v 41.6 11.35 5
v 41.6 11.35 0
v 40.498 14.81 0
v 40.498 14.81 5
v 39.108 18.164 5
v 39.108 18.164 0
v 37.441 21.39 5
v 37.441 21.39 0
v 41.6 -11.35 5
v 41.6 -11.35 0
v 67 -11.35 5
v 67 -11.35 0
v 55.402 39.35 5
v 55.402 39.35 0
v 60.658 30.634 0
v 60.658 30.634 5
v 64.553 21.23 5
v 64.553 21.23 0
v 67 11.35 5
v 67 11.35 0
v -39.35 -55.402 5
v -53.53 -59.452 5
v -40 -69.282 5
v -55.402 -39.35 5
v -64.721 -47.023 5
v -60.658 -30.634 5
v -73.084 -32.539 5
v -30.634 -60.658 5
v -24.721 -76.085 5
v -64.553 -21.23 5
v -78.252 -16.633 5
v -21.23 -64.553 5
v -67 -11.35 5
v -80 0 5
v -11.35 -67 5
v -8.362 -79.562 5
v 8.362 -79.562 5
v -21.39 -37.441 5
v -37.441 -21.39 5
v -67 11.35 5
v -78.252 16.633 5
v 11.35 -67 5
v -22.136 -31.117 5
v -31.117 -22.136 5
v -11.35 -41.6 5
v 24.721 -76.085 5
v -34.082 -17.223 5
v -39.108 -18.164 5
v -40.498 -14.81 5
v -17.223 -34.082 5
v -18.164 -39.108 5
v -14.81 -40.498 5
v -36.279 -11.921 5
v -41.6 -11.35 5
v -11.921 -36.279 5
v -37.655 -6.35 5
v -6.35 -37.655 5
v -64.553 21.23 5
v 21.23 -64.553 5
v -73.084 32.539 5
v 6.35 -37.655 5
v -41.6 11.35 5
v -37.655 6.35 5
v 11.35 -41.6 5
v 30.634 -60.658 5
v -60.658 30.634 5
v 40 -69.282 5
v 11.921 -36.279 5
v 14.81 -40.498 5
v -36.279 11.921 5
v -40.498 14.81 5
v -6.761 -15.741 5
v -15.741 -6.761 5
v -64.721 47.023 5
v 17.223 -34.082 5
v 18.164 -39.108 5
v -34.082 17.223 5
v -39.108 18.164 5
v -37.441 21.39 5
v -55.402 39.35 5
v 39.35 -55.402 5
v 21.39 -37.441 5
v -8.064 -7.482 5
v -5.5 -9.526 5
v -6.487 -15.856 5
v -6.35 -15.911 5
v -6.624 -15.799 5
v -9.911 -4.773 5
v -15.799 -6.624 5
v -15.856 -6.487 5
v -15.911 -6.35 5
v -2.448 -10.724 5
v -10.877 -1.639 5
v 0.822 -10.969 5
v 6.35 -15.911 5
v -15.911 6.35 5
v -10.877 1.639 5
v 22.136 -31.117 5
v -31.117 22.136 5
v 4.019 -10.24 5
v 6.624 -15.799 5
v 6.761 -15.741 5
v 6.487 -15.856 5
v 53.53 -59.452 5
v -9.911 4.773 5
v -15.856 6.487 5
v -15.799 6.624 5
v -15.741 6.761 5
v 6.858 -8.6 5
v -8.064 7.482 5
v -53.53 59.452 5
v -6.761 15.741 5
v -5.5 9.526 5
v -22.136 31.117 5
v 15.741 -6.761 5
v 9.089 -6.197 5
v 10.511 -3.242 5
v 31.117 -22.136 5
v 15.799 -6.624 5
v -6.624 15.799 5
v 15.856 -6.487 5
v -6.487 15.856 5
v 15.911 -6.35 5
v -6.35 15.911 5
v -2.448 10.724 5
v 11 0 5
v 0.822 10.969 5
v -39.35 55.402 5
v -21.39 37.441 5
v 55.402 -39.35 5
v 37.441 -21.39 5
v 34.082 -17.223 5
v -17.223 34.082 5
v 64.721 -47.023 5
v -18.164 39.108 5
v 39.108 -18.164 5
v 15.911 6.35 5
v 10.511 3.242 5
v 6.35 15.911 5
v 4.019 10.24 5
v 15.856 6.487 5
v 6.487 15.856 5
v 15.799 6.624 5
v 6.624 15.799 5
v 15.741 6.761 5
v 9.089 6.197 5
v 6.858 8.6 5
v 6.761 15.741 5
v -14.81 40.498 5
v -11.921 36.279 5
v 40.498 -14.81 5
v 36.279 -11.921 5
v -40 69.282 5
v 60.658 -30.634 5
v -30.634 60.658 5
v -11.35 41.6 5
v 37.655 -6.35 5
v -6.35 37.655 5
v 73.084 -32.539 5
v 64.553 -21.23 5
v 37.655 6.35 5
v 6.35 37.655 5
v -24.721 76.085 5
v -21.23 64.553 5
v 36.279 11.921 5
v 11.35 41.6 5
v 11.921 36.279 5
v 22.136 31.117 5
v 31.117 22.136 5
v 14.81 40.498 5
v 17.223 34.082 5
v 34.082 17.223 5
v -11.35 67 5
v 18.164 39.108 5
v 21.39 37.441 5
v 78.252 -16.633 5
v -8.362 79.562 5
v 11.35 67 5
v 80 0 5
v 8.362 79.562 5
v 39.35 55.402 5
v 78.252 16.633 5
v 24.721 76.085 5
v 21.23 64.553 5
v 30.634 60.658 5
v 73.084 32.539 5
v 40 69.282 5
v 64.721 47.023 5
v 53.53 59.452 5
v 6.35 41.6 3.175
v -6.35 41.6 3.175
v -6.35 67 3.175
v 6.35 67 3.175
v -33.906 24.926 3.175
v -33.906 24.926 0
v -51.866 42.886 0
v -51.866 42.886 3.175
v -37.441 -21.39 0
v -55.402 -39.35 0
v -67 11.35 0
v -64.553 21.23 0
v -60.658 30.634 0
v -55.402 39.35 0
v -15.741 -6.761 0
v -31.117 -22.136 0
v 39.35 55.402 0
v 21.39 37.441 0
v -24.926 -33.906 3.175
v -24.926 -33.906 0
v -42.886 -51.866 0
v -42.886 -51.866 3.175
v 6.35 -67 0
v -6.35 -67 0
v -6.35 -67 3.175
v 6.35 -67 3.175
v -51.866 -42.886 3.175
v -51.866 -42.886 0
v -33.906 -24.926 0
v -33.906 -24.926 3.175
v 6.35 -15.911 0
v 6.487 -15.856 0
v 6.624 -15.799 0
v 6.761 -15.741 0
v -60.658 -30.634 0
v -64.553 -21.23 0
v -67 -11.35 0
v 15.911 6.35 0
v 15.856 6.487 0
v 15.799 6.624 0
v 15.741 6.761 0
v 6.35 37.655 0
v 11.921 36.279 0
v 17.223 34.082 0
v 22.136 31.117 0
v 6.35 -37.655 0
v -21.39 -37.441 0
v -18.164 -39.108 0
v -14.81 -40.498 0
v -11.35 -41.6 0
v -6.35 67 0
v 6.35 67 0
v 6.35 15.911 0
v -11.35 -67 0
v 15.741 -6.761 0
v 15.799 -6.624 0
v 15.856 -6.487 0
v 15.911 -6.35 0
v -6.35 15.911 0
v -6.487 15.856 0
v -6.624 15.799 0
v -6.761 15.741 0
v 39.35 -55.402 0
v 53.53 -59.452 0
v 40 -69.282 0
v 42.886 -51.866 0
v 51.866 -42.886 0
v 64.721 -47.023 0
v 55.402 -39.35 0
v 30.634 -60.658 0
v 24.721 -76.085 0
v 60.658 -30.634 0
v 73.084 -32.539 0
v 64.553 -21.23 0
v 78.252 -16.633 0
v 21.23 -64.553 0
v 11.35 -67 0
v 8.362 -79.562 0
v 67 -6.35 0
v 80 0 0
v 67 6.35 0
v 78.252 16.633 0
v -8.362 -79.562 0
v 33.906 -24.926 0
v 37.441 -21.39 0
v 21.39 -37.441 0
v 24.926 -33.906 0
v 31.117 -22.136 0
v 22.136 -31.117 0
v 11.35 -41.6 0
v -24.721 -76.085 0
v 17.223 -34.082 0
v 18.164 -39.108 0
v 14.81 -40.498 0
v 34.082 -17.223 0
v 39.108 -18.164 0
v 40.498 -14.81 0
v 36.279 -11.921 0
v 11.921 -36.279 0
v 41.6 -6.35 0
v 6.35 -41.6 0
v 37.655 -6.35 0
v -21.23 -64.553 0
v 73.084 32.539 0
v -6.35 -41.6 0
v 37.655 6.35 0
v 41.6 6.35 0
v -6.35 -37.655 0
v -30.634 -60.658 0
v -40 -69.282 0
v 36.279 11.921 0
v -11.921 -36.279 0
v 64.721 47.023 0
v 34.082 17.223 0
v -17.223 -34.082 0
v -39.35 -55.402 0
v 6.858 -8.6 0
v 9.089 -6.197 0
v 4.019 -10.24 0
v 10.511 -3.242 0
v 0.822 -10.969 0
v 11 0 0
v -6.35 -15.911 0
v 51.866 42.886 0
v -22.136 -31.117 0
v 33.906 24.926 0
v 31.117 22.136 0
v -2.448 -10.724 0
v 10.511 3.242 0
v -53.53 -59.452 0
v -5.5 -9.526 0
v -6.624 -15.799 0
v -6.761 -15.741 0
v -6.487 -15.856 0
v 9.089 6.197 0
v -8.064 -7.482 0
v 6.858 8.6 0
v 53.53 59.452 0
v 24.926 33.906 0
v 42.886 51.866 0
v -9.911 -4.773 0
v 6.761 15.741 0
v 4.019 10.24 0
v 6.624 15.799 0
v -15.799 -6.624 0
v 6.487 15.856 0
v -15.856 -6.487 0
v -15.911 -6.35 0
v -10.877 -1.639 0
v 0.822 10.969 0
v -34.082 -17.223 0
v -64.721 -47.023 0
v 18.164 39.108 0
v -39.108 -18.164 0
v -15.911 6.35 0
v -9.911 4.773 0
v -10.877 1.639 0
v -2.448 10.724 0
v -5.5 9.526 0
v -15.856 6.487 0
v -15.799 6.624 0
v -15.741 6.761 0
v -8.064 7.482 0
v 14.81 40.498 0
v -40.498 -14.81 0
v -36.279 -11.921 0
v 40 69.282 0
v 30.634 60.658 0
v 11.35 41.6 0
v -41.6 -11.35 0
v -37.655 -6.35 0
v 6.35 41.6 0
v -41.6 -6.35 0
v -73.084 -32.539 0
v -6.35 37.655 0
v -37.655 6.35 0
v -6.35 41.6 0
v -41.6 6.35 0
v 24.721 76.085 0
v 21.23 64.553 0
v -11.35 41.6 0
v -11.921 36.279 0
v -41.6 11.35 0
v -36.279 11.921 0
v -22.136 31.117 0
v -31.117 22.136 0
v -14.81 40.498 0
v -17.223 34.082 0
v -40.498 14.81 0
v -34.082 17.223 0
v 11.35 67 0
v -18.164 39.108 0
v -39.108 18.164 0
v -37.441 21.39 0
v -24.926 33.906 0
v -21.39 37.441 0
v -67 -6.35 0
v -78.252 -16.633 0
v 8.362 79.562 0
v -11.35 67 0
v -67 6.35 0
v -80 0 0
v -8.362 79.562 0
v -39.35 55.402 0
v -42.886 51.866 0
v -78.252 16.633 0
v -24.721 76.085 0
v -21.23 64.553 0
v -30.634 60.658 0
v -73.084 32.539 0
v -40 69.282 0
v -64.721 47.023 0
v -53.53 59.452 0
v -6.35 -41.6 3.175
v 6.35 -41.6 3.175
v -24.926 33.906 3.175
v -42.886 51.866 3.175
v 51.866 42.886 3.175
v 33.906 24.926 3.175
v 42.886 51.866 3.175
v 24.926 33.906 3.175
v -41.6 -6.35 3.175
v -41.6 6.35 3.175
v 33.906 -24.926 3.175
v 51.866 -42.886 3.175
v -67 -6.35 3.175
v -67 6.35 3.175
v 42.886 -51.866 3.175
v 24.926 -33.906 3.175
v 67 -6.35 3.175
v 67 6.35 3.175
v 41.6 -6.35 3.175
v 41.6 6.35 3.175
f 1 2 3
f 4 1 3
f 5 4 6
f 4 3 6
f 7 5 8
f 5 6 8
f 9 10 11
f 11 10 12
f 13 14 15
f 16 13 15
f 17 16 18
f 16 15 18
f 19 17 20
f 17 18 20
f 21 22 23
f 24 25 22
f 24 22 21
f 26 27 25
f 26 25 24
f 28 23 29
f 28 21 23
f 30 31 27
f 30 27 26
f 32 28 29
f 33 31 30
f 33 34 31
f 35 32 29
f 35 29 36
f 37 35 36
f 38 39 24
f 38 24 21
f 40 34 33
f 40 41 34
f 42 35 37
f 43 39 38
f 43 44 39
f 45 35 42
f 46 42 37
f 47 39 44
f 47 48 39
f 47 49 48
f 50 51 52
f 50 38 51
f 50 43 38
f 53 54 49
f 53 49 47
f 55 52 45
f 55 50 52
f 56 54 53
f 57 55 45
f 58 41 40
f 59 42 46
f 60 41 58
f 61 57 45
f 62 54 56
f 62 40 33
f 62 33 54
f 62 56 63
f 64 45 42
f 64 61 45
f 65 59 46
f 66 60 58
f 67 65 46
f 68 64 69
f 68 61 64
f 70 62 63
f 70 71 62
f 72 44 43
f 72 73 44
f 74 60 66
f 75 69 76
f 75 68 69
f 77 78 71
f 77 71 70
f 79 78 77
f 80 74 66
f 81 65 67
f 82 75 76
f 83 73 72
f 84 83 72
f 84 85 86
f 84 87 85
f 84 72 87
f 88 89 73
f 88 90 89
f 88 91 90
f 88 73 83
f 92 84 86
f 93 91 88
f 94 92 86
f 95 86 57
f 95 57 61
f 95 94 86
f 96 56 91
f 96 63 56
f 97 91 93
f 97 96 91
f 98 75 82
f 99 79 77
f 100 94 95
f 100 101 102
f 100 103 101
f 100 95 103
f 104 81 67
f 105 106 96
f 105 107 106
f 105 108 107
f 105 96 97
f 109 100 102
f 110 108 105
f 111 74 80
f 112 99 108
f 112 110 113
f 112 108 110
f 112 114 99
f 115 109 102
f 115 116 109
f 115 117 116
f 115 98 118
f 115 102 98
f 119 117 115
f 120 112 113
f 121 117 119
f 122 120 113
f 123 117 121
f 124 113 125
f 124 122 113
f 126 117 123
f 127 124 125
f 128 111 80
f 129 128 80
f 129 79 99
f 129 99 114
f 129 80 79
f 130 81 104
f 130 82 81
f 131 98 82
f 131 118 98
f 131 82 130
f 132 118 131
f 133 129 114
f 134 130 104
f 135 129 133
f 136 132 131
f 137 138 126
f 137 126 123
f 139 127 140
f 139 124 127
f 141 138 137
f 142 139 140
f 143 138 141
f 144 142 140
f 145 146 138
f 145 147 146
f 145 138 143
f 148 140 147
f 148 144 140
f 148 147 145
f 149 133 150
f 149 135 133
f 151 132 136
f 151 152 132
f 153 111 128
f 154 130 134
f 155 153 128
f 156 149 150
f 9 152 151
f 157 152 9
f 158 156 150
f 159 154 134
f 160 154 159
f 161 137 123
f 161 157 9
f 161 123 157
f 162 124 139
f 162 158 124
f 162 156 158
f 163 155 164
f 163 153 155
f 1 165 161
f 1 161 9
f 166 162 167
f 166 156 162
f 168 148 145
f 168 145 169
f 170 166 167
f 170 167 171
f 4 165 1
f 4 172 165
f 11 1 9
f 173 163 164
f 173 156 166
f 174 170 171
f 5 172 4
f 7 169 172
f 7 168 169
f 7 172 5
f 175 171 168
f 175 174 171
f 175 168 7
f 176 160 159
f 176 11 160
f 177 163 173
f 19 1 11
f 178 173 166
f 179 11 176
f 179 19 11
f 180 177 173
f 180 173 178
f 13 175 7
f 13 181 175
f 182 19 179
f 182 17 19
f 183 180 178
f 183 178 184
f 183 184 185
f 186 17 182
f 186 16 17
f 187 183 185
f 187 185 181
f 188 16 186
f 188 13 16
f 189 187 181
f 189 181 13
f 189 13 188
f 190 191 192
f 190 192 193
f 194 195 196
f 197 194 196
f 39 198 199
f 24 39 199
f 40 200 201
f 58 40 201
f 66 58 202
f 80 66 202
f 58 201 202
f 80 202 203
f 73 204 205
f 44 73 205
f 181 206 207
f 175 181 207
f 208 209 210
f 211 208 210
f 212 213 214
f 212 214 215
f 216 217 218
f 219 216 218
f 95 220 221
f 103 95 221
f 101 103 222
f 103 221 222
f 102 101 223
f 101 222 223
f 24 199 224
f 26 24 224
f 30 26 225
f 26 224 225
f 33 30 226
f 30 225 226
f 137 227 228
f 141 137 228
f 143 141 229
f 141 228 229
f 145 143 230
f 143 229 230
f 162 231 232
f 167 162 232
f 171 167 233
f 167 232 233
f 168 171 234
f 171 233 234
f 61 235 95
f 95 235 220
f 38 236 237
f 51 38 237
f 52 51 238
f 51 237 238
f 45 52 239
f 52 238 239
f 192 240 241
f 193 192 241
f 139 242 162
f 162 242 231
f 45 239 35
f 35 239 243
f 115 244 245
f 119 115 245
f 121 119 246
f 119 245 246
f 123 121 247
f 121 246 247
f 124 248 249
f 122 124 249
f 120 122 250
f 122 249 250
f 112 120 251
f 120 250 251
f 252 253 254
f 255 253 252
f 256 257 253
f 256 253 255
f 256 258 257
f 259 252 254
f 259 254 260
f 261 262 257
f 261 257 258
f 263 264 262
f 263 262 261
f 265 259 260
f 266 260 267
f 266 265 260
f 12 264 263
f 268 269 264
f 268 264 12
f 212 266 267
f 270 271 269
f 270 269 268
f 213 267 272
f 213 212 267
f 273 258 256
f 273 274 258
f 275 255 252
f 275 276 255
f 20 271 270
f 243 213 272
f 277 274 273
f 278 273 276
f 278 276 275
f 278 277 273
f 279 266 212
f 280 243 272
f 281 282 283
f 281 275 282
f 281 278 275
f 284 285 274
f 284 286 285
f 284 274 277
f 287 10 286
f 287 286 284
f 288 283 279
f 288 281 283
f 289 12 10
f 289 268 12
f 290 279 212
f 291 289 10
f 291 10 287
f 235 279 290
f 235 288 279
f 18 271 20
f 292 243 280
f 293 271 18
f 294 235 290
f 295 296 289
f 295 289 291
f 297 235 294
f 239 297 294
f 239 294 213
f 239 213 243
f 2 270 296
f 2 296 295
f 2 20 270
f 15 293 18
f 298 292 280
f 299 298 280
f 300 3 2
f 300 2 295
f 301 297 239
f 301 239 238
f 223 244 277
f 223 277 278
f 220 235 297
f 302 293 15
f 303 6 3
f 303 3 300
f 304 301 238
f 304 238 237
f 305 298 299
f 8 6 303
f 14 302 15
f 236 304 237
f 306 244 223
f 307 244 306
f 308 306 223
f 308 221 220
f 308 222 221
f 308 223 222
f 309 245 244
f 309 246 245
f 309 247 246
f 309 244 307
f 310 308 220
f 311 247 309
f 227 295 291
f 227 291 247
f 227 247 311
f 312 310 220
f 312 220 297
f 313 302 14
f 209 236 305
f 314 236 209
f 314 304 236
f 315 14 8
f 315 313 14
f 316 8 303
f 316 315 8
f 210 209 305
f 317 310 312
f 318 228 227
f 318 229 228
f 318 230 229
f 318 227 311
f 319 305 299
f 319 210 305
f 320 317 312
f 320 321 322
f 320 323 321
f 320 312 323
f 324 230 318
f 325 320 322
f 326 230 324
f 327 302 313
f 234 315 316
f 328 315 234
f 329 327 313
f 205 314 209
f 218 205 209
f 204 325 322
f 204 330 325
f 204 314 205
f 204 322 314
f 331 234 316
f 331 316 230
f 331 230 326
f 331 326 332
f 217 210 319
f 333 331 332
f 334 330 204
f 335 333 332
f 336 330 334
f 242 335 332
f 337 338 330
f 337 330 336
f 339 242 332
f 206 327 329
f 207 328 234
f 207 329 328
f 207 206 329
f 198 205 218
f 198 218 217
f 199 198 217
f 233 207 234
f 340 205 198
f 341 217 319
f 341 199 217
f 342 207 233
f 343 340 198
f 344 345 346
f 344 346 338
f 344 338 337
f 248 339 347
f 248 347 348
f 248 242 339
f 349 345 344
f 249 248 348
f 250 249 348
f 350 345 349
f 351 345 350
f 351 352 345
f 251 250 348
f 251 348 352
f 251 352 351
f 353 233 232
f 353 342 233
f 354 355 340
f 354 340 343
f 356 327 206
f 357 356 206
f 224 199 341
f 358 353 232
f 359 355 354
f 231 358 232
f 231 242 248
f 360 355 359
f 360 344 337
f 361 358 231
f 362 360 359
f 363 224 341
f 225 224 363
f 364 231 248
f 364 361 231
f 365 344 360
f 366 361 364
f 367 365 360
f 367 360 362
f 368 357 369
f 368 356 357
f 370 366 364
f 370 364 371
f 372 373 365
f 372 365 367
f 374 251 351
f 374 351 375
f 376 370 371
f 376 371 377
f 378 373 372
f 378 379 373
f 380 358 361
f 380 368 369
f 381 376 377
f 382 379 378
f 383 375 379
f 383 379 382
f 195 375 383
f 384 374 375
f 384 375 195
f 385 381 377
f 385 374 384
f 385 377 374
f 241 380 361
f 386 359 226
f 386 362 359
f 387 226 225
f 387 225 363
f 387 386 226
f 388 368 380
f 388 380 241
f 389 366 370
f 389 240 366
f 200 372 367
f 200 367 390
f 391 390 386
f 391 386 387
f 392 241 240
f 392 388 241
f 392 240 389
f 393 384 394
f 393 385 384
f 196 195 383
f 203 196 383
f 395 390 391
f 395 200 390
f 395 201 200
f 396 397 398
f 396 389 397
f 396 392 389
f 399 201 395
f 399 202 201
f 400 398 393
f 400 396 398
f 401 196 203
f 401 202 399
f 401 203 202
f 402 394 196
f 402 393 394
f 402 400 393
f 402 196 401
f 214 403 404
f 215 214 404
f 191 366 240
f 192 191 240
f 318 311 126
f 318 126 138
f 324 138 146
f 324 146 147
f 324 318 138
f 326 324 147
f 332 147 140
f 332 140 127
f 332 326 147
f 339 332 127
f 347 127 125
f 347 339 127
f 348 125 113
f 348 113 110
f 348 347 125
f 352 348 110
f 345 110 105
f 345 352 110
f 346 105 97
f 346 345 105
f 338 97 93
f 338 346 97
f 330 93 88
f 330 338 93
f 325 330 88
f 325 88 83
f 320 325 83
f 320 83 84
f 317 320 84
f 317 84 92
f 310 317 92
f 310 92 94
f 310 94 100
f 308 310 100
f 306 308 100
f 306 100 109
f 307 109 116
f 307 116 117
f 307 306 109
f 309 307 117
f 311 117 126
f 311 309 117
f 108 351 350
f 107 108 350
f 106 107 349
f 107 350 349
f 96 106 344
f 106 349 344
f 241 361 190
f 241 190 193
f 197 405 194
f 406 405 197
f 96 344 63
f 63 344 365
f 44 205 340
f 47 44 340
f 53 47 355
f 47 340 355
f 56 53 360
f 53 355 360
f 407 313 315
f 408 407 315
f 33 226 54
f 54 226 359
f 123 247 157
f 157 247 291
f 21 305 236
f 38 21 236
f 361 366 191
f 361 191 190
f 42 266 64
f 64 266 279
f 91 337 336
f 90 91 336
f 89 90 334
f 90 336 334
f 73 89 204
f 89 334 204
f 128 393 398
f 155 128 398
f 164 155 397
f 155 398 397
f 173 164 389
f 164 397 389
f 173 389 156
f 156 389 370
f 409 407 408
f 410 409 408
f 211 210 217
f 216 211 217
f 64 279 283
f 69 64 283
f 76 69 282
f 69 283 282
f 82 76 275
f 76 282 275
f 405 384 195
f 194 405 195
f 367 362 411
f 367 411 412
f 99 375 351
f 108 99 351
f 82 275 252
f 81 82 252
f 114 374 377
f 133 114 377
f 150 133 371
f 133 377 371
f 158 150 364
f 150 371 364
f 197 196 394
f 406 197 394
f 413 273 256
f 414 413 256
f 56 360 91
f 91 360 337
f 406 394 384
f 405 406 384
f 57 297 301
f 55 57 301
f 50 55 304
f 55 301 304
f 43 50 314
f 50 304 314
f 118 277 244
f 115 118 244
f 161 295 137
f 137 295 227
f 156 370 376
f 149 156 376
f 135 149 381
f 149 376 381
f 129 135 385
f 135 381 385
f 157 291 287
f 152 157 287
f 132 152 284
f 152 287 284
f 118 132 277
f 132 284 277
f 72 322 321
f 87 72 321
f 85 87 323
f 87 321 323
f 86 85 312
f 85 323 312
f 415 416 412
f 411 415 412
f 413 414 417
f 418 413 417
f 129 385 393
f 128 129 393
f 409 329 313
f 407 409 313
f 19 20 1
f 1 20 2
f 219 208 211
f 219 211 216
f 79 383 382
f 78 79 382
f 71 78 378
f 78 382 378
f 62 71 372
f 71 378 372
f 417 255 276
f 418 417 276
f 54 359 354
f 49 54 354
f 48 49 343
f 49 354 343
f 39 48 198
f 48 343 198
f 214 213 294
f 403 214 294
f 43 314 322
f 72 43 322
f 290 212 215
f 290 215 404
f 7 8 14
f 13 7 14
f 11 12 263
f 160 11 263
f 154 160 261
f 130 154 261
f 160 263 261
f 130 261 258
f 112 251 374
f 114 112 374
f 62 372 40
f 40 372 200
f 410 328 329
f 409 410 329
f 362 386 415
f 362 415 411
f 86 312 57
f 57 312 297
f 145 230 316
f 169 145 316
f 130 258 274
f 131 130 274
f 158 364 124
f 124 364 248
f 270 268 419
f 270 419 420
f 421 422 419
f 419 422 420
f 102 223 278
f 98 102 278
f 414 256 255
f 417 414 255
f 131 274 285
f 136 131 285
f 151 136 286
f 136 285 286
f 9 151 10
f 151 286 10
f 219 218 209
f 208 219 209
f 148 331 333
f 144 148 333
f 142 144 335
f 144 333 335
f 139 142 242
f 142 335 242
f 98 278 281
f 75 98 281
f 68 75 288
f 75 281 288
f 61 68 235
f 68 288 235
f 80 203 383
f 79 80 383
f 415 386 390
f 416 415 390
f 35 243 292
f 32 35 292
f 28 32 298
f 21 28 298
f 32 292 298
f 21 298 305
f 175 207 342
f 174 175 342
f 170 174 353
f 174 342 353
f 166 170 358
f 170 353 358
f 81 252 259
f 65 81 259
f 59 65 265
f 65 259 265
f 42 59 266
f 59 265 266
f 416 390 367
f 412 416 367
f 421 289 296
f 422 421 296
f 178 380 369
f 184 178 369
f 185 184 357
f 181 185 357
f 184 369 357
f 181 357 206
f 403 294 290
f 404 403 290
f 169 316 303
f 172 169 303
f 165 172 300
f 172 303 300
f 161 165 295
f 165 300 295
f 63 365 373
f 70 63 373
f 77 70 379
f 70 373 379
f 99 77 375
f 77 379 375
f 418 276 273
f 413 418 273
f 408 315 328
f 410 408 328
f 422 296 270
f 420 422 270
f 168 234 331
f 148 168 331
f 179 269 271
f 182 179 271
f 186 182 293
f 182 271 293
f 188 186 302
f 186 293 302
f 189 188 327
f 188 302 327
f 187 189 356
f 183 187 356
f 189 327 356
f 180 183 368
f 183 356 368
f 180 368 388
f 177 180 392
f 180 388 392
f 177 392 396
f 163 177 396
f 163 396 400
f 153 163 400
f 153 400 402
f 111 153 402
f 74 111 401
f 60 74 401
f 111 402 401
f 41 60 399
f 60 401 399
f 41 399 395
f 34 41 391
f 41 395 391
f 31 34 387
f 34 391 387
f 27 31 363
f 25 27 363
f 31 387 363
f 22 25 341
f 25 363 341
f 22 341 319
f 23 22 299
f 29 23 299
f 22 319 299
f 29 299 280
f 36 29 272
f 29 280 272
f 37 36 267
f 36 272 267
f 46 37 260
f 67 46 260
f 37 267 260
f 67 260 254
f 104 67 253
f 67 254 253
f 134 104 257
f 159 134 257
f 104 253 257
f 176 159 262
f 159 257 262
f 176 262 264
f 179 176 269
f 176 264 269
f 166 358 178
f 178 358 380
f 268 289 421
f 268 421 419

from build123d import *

# Parameters (mm, degrees)
SKETCH1_R           = 80
SKETCH1_R_2         = 11
BOSS_EXTRUDE1_DEPTH = 5
SKETCH1_3_W         = 25.4
SKETCH1_3_H         = 12.7
SKETCH1_3_W_2       = 12.7
SKETCH1_3_H_2       = 25.4
CUT_EXTRUDE2_DEPTH  = 3.175
CUT_EXTRUDE3_DEPTH  = 19
CUT_EXTRUDE4_DEPTH  = 19


with BuildPart() as part:
    # Sketch1 → Boss-Extrude1 (new body)
    with BuildSketch(Plane.XY):
        Circle(SKETCH1_R)
        Circle(SKETCH1_R_2, mode=Mode.SUBTRACT)
    extrude(amount=BOSS_EXTRUDE1_DEPTH)

    # Sketch1<3> → Cut-Extrude2 (cut)
    with BuildSketch(Plane.XY):
        Polygon((33.905770158, -24.925514037), (51.8662824, -42.886026279), (42.886026279, -51.8662824), (24.925514037, -33.905770158), align=None)
        with Locations((54.3, 0)):
            Rectangle(SKETCH1_3_W, SKETCH1_3_H)
        with Locations((0, -54.3)):
            Rectangle(SKETCH1_3_W_2, SKETCH1_3_H_2)
        Polygon((-24.925514037, -33.905770158), (-42.886026279, -51.8662824), (-51.8662824, -42.886026279), (-33.905770158, -24.925514037), align=None)
        with Locations((-54.3, 0)):
            Rectangle(SKETCH1_3_W, SKETCH1_3_H)
        Polygon((-33.905770158, 24.925514037), (-51.8662824, 42.886026279), (-42.886026279, 51.8662824), (-24.925514037, 33.905770158), align=None)
        with Locations((0, 54.3)):
            Rectangle(SKETCH1_3_W_2, SKETCH1_3_H_2)
        Polygon((24.925514037, 33.905770158), (42.886026279, 51.8662824), (51.8662824, 42.886026279), (33.905770158, 24.925514037), align=None)
    extrude(amount=CUT_EXTRUDE2_DEPTH, mode=Mode.SUBTRACT)

    # Sketch2 → Cut-Extrude3 (cut)
    with BuildSketch(Plane(origin=(0, 0, 0), x_dir=(-1, 0, 0), z_dir=(0, 0, -1))):
        with BuildLine():
            ThreePointArc((31.116508001, -22.13625188), (35.280233052, -14.613551014), (37.655387628, -6.35))
            Line((37.655387628, -6.35), (15.911210185, -6.35))
            ThreePointArc((15.911210185, -6.35), (15.827464249, -6.55595035), (15.741052679, -6.760796558))
            Line((15.741052679, -6.760796558), (31.116508001, -22.13625188))
        make_face()
        with BuildLine():
            ThreePointArc((6.35, -37.655387628), (14.613551014, -35.280233052), (22.13625188, -31.116508001))
            Line((22.13625188, -31.116508001), (6.760796558, -15.741052679))
            ThreePointArc((6.760796558, -15.741052679), (6.55595035, -15.827464249), (6.35, -15.911210185))
            Line((6.35, -15.911210185), (6.35, -37.655387628))
        make_face()
        with BuildLine():
            Line((15.911210185, 6.35), (37.655387628, 6.35))
            ThreePointArc((37.655387628, 6.35), (35.280233052, 14.613551014), (31.116508001, 22.13625188))
            Line((31.116508001, 22.13625188), (15.741052679, 6.760796558))
            ThreePointArc((15.741052679, 6.760796558), (15.827464249, 6.55595035), (15.911210185, 6.35))
        make_face()
        with BuildLine():
            ThreePointArc((-22.13625188, -31.116508001), (-14.613551014, -35.280233052), (-6.35, -37.655387628))
            Line((-6.35, -37.655387628), (-6.35, -15.911210185))
            ThreePointArc((-6.35, -15.911210185), (-6.55595035, -15.827464249), (-6.760796558, -15.741052679))
            Line((-6.760796558, -15.741052679), (-22.13625188, -31.116508001))
        make_face()
        with BuildLine():
            Line((6.760796558, 15.741052679), (22.13625188, 31.116508001))
            ThreePointArc((22.13625188, 31.116508001), (14.613551014, 35.280233052), (6.35, 37.655387628))
            Line((6.35, 37.655387628), (6.35, 15.911210185))
            ThreePointArc((6.35, 15.911210185), (6.55595035, 15.827464249), (6.760796558, 15.741052679))
        make_face()
        with BuildLine():
            ThreePointArc((-37.655387628, -6.35), (-35.280233052, -14.613551014), (-31.116508001, -22.13625188))
            Line((-31.116508001, -22.13625188), (-15.741052679, -6.760796558))
            ThreePointArc((-15.741052679, -6.760796558), (-15.827464249, -6.55595035), (-15.911210185, -6.35))
            Line((-15.911210185, -6.35), (-37.655387628, -6.35))
        make_face()
        with BuildLine():
            Line((-6.35, 15.911210185), (-6.35, 37.655387628))
            ThreePointArc((-6.35, 37.655387628), (-14.613551014, 35.280233052), (-22.13625188, 31.116508001))
            Line((-22.13625188, 31.116508001), (-6.760796558, 15.741052679))
            ThreePointArc((-6.760796558, 15.741052679), (-6.55595035, 15.827464249), (-6.35, 15.911210185))
        make_face()
        with BuildLine():
            ThreePointArc((-31.116508001, 22.13625188), (-35.280233052, 14.613551014), (-37.655387628, 6.35))
            Line((-37.655387628, 6.35), (-15.911210185, 6.35))
            ThreePointArc((-15.911210185, 6.35), (-15.827464249, 6.55595035), (-15.741052679, 6.760796558))
            Line((-15.741052679, 6.760796558), (-31.116508001, 22.13625188))
        make_face()
    extrude(amount=-CUT_EXTRUDE3_DEPTH, mode=Mode.SUBTRACT)

    # Sketch3 → Cut-Extrude4 (cut)
    with BuildSketch(Plane(origin=(0, 0, 0), x_dir=(-1, 0, 0), z_dir=(0, 0, -1))):
        with BuildLine():
            Line((39.350492373, -55.401816306), (21.389980131, -37.441304064))
            ThreePointArc((21.389980131, -37.441304064), (16.501523042, -39.838200729), (11.35, -41.6))
            Line((11.35, -41.6), (11.35, -67))
            ThreePointArc((11.35, -67), (26.005085041, -62.781828996), (39.350492373, -55.401816306))
        make_face()
        with BuildLine():
            Line((55.401816306, 39.350492373), (37.441304064, 21.389980131))
            ThreePointArc((37.441304064, 21.389980131), (39.838200729, 16.501523042), (41.6, 11.35))
            Line((41.6, 11.35), (67, 11.35))
            ThreePointArc((67, 11.35), (62.781828996, 26.005085041), (55.401816306, 39.350492373))
        make_face()
        with BuildLine():
            Line((-55.401816306, -39.350492373), (-37.441304064, -21.389980131))
            ThreePointArc((-37.441304064, -21.389980131), (-39.838200729, -16.501523042), (-41.6, -11.35))
            Line((-41.6, -11.35), (-67, -11.35))
            ThreePointArc((-67, -11.35), (-62.781828996, -26.005085041), (-55.401816306, -39.350492373))
        make_face()
        with BuildLine():
            Line((-39.350492373, 55.401816306), (-21.389980131, 37.441304064))
            ThreePointArc((-21.389980131, 37.441304064), (-16.501523042, 39.838200729), (-11.35, 41.6))
            Line((-11.35, 41.6), (-11.35, 67))
            ThreePointArc((-11.35, 67), (-26.005085041, 62.781828996), (-39.350492373, 55.401816306))
        make_face()
        with BuildLine():
            Line((67, -11.35), (41.6, -11.35))
            ThreePointArc((41.6, -11.35), (39.838200729, -16.501523042), (37.441304064, -21.389980131))
            Line((37.441304064, -21.389980131), (55.401816306, -39.350492373))
            ThreePointArc((55.401816306, -39.350492373), (62.781828996, -26.005085041), (67, -11.35))
        make_face()
        with BuildLine():
            Line((-11.35, -67), (-11.35, -41.6))
            ThreePointArc((-11.35, -41.6), (-16.501523042, -39.838200729), (-21.389980131, -37.441304064))
            Line((-21.389980131, -37.441304064), (-39.350492373, -55.401816306))
            ThreePointArc((-39.350492373, -55.401816306), (-26.005085041, -62.781828996), (-11.35, -67))
        make_face()
        with BuildLine():
            Line((-67, 11.35), (-41.6, 11.35))
            ThreePointArc((-41.6, 11.35), (-39.838200729, 16.501523042), (-37.441304064, 21.389980131))
            Line((-37.441304064, 21.389980131), (-55.401816306, 39.350492373))
            ThreePointArc((-55.401816306, 39.350492373), (-62.781828996, 26.005085041), (-67, 11.35))
        make_face()
        with BuildLine():
            Line((11.35, 67), (11.35, 41.6))
            ThreePointArc((11.35, 41.6), (16.501523042, 39.838200729), (21.389980131, 37.441304064))
            Line((21.389980131, 37.441304064), (39.350492373, 55.401816306))
            ThreePointArc((39.350492373, 55.401816306), (26.005085041, 62.781828996), (11.35, 67))
        make_face()
    extrude(amount=-CUT_EXTRUDE4_DEPTH, mode=Mode.SUBTRACT)


solid = part.part
